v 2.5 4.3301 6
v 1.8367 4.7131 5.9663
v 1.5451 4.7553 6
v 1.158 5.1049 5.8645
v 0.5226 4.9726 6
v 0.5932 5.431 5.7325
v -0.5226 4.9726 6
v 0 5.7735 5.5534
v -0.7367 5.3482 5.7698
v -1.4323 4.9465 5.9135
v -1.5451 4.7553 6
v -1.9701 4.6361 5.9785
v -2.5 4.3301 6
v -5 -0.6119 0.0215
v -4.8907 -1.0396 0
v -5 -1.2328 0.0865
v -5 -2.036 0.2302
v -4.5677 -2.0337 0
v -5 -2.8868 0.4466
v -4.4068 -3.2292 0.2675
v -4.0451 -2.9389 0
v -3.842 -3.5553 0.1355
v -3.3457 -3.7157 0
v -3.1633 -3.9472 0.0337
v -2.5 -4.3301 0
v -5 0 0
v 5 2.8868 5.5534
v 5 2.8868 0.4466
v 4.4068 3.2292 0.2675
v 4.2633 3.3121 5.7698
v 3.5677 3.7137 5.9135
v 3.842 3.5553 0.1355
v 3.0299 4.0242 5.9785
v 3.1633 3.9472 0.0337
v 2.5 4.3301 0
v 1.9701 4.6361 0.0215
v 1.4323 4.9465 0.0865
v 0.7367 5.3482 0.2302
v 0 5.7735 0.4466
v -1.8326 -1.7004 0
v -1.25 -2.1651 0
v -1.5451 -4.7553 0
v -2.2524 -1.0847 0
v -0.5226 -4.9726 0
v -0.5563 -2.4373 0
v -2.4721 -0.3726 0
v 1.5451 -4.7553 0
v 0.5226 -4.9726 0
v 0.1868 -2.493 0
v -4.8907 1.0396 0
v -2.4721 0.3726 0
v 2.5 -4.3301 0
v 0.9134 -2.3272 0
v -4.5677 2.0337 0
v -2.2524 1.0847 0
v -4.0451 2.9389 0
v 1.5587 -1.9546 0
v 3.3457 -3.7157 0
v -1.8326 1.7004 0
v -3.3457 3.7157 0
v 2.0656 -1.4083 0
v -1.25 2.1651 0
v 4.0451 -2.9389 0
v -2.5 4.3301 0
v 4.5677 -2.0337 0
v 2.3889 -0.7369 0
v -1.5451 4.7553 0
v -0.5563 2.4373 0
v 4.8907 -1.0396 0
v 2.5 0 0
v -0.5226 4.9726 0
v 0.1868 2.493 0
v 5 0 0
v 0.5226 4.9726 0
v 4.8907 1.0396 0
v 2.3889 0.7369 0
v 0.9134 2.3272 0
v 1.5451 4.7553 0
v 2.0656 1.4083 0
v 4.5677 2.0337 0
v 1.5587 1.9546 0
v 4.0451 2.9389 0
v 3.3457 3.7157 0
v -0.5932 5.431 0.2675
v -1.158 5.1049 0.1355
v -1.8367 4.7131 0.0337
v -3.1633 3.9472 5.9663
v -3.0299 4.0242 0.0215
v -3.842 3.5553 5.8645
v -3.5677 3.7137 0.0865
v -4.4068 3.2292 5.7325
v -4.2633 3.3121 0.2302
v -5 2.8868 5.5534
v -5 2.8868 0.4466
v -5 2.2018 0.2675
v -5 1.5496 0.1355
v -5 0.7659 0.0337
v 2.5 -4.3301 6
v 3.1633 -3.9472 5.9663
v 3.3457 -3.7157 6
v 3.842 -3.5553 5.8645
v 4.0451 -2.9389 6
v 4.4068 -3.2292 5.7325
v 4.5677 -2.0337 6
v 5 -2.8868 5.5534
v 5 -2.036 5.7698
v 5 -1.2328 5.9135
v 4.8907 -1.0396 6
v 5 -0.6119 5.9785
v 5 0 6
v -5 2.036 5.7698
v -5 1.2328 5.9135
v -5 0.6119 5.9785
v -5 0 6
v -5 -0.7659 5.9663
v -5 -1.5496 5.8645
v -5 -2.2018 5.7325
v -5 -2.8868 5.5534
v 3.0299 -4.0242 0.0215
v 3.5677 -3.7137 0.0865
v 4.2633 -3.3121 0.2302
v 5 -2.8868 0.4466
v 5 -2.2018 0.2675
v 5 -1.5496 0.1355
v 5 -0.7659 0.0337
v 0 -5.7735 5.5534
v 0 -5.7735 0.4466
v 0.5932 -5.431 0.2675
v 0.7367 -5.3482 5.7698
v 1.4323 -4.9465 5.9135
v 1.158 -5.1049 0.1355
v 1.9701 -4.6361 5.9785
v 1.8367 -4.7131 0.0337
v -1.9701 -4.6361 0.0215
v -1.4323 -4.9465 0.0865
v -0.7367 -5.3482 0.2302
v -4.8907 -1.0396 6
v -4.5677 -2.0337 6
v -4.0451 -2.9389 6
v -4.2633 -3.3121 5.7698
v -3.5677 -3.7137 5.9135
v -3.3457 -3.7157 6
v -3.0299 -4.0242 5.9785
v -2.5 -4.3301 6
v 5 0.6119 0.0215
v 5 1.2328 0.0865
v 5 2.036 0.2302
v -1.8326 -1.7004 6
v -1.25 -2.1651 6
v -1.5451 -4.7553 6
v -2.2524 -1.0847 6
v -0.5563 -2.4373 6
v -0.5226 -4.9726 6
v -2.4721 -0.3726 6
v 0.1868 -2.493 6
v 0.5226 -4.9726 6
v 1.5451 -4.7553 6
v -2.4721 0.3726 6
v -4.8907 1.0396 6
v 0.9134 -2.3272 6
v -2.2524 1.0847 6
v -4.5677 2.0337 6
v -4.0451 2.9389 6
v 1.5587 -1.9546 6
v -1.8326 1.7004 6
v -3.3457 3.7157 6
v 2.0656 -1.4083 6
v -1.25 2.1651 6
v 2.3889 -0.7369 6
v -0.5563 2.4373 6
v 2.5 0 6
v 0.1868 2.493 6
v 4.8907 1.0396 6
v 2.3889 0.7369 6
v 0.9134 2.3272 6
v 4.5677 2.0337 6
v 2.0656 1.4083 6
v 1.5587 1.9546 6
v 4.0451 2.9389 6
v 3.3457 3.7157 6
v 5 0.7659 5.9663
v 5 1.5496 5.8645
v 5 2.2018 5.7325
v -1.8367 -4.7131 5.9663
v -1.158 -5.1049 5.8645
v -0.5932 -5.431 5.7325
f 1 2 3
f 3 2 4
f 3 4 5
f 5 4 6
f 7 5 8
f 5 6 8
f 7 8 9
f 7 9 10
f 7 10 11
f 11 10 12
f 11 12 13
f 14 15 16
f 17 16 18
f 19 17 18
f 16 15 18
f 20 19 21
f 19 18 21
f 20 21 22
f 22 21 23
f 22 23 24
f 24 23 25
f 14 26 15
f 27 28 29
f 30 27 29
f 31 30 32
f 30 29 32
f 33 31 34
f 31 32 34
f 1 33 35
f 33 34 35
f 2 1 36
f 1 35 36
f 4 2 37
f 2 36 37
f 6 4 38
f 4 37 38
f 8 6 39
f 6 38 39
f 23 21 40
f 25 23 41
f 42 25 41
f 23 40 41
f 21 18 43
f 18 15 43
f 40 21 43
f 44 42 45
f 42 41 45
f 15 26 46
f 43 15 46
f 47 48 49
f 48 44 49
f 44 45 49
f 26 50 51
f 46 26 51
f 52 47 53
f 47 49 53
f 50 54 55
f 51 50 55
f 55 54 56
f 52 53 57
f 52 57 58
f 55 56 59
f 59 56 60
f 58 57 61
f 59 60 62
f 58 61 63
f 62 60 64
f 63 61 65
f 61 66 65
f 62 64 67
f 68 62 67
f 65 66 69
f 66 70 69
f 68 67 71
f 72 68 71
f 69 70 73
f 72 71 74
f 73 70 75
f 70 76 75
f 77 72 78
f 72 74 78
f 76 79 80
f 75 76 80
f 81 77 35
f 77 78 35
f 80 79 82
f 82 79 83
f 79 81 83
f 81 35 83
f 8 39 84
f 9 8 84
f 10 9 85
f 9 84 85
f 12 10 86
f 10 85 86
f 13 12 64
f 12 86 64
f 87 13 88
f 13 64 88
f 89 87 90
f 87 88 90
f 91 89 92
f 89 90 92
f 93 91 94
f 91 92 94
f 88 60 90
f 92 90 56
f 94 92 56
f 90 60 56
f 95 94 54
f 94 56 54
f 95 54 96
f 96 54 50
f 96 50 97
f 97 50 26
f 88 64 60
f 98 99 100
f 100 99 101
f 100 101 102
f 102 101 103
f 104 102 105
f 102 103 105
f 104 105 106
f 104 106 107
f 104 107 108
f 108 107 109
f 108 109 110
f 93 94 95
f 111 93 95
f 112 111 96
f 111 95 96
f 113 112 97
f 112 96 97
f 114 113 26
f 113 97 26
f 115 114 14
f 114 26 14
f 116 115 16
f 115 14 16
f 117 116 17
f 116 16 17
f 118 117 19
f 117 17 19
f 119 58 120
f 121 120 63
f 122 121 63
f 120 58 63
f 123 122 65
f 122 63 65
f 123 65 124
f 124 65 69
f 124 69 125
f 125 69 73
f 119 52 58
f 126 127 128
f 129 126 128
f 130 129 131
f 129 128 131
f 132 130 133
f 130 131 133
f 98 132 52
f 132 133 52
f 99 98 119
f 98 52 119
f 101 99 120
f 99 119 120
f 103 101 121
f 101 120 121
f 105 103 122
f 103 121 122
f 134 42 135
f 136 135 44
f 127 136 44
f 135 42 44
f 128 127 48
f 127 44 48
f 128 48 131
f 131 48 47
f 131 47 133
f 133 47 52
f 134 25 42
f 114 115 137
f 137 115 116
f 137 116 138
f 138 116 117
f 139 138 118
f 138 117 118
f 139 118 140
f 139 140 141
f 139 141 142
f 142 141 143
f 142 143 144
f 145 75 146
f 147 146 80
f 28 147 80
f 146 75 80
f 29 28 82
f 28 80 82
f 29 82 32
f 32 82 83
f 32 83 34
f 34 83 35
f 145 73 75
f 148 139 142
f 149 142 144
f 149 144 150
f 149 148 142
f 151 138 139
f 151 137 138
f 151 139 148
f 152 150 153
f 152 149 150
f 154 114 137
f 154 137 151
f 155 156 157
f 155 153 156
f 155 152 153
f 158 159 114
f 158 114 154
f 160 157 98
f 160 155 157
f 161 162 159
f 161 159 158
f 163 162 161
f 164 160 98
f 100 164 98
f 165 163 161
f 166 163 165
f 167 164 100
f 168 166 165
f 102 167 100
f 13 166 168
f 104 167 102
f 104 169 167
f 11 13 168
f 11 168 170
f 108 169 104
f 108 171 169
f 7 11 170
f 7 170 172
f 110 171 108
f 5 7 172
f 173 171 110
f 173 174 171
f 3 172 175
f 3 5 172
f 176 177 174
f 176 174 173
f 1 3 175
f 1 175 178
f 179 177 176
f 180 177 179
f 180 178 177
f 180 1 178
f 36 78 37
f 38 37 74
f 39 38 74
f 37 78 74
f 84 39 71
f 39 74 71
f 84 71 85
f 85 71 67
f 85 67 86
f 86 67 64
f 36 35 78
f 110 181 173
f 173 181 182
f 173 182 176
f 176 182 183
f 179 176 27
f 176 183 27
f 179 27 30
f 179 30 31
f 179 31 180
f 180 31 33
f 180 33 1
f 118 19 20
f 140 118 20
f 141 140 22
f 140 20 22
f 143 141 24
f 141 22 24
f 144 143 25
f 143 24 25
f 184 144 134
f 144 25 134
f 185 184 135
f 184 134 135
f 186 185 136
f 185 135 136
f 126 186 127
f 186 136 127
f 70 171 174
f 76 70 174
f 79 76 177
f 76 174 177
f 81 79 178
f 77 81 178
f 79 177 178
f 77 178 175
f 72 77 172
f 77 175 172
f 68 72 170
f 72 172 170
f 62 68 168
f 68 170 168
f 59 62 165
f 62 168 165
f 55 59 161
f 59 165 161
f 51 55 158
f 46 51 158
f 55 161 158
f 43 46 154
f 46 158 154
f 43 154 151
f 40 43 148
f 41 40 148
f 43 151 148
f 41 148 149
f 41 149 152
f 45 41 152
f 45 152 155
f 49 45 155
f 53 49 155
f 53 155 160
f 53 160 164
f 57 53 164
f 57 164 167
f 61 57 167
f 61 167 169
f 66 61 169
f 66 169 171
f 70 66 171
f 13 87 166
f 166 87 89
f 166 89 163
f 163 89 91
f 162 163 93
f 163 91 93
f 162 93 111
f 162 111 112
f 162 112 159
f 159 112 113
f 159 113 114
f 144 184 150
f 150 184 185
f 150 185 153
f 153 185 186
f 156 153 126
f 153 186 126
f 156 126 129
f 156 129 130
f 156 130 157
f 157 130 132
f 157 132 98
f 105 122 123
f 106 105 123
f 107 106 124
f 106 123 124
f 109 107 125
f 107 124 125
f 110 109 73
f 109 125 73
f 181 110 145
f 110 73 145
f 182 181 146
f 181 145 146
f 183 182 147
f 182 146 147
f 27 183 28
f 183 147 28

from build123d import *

# Parameters (mm, degrees)
BOSS_EXTRU_1_DEPTH      = 6
ENL_V_MAT_EXTRU_1_REACH = 8
ESQUISSE2_R             = 2.5


with BuildPart() as part:
    # Esquisse1 → Boss.-Extru.1 (new body)
    with BuildSketch(Plane.XY):
        Polygon((0, 5.773502692), (-5, 2.886751346), (-5, -2.886751346), (0, -5.773502692), (5, -2.886751346), (5, 2.886751346), align=None)
    extrude(amount=BOSS_EXTRU_1_DEPTH)

    # Esquisse2 → Enlèv. mat.-Extru.1 (cut, up to next)
    with BuildSketch(Plane.XY.offset(6), mode=Mode.PRIVATE) as enl_v_mat_extru_1_sk1:
        Circle(ESQUISSE2_R)
    enl_v_mat_extru_1_tool1 = extrude(enl_v_mat_extru_1_sk1.sketch, amount=-ENL_V_MAT_EXTRU_1_REACH, mode=Mode.PRIVATE) & part.part
    add(enl_v_mat_extru_1_tool1.solids().sort_by_distance((0, 0, 6))[0], mode=Mode.SUBTRACT)

    # Esquisse4 → Enlèvement de matière-Révolution8 (revolve, cut)
    with BuildSketch(Plane(origin=(0, 0, 0), x_dir=(1, 0, 0), z_dir=(0, 1, 0))):
        Polygon((-10.196152423, -3), (-3.267949192, 1), (-11.196152423, 1), (-11.196152423, -7), (-3.267949192, -7), align=None)
    revolve(axis=Axis((0, 0, 0), (0, 0, 1)), mode=Mode.SUBTRACT)


solid = part.part
